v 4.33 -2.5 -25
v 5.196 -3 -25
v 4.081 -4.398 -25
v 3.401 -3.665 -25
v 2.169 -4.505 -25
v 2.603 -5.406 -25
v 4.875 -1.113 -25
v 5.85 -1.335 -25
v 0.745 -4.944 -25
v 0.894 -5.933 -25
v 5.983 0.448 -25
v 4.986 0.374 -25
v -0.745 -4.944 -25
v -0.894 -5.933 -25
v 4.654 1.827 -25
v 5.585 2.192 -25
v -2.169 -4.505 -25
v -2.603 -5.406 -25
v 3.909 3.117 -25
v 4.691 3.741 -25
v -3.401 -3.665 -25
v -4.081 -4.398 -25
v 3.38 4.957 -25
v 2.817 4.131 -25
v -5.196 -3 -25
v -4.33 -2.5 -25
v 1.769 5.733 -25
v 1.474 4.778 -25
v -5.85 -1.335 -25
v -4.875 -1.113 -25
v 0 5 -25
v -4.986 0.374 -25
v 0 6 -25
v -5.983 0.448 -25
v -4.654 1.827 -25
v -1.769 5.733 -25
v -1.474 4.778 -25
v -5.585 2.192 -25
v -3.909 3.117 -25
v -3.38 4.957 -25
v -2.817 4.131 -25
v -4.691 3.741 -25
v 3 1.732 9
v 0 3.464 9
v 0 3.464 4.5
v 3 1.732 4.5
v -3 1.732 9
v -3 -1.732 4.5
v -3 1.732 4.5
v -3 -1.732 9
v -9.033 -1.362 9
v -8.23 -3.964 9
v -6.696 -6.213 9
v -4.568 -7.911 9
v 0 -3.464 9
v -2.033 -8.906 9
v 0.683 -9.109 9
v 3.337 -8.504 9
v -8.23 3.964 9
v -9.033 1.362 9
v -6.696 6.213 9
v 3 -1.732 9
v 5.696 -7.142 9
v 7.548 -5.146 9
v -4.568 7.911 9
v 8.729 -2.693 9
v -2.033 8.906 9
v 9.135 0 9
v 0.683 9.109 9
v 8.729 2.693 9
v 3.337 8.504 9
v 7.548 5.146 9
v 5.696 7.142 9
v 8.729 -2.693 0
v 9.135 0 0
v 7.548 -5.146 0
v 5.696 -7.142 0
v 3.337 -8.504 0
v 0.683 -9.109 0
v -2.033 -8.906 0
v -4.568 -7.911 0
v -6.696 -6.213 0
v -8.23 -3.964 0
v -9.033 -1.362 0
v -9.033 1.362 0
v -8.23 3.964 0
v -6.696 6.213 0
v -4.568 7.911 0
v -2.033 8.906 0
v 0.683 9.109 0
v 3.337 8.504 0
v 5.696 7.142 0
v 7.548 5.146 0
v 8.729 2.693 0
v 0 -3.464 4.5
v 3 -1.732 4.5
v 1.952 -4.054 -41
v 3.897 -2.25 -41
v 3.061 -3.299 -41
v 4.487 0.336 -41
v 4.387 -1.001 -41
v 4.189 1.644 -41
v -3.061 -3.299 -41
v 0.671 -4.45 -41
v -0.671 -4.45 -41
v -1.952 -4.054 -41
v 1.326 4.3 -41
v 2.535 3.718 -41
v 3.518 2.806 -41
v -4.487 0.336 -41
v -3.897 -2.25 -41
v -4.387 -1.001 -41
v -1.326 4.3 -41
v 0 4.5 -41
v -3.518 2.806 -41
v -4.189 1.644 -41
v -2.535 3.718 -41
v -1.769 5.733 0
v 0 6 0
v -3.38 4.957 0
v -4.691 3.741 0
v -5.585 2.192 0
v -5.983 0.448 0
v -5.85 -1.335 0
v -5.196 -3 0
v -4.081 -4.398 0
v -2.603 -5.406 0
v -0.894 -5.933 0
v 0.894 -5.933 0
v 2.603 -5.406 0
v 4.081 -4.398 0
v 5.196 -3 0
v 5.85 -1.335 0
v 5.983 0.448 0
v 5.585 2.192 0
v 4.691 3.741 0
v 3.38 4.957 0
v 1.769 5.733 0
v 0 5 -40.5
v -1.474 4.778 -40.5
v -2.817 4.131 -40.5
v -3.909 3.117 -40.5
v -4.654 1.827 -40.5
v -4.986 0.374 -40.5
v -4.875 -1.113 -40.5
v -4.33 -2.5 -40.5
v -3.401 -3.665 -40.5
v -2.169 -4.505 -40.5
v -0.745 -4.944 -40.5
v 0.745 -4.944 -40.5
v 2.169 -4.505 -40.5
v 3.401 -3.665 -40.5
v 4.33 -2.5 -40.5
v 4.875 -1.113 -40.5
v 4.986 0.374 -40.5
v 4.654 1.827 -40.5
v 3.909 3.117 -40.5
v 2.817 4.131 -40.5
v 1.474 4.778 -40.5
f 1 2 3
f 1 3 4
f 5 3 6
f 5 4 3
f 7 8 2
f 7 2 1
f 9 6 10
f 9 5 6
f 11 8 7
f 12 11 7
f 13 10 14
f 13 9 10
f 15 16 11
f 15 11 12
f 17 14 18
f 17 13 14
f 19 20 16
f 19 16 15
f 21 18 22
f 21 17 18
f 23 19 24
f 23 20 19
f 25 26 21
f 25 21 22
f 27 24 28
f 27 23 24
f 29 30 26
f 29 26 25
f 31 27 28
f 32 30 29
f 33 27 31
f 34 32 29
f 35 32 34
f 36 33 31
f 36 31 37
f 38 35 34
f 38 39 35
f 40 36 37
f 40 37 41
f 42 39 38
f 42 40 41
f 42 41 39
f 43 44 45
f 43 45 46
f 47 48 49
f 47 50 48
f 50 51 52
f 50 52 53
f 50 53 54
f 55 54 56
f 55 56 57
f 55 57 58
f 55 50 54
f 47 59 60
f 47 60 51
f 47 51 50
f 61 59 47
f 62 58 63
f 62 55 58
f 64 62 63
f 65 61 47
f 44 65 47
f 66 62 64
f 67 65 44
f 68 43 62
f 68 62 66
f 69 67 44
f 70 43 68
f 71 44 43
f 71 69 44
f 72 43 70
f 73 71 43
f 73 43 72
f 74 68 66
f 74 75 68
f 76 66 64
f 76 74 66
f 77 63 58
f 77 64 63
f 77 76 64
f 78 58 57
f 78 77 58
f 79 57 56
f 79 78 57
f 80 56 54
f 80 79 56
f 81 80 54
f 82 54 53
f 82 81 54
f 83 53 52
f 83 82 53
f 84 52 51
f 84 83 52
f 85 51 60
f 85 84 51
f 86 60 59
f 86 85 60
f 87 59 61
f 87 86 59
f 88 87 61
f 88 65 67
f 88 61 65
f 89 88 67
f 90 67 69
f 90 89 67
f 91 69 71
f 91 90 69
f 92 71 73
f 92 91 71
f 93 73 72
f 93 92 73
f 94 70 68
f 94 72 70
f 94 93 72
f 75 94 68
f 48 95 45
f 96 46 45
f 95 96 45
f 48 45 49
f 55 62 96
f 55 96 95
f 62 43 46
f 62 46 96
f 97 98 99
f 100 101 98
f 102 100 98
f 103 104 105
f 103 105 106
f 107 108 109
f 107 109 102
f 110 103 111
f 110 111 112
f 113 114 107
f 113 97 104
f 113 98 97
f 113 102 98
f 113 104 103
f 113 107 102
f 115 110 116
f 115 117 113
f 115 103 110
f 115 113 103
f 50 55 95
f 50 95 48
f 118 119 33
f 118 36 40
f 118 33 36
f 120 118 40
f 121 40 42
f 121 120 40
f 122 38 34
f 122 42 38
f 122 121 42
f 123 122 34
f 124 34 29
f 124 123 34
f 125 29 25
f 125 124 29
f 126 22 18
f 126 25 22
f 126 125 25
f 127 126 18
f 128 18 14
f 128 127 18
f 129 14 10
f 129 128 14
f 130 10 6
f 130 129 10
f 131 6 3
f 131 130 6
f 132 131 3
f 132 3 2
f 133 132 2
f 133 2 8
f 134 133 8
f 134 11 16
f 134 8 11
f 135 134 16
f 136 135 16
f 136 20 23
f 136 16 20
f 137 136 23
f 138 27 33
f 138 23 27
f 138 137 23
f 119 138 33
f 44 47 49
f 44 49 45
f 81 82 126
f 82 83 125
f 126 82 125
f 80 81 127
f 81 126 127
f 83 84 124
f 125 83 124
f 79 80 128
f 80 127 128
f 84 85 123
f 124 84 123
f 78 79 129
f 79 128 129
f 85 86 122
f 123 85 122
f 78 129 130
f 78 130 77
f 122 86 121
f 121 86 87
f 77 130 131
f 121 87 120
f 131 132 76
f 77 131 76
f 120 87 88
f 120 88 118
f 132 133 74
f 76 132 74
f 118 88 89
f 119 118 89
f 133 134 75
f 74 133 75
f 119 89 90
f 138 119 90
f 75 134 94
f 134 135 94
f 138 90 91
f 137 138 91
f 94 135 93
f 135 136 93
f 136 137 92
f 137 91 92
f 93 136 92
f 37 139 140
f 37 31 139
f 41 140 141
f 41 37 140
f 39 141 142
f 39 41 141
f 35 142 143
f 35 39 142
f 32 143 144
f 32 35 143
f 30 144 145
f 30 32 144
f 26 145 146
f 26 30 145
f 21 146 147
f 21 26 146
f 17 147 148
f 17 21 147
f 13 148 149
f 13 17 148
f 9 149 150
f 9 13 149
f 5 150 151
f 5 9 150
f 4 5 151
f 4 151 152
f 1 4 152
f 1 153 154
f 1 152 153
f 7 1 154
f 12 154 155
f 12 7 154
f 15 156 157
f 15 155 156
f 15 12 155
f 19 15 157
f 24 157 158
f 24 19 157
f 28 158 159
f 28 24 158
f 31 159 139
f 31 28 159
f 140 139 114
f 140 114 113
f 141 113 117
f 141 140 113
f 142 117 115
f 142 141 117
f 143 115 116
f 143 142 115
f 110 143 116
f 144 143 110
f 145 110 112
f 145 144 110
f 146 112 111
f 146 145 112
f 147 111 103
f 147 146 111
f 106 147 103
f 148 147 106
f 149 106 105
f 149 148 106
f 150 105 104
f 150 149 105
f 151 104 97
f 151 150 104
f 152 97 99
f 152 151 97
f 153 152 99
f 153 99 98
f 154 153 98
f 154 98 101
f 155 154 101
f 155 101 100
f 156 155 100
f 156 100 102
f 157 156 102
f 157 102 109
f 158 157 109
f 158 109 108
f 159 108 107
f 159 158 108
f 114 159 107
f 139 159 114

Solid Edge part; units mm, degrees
sketch "Sketch1" plane through (0, 0, 0) normal (0, 0, 1) x (1, 0, 0)
  circle A0 centre (0, 0) radius 9.135
  dimension "D1" = 18.27
extrude "Protrusion1" add sketch "Sketch1" along normal blind 9
sketch "Sketch2" plane through (0, 0, 9) normal (0, 0, 1) x (1, 0, 0)
  line L0 (0, -3.4641) -> (-3, -1.7321)
  line L1 (-3, -1.7321) -> (-3, 1.7321)
  line L2 (-3, 1.7321) -> (0, 3.4641)
  line L3 (0, 3.4641) -> (3, 1.7321)
  line L4 (3, 1.7321) -> (3, -1.7321)
  line L5 (3, -1.7321) -> (0, -3.4641)
  dimension "D1" = 6
extrude "Cutout1" cut sketch "Sketch2" against normal blind 4.5
sketch "Sketch3" plane through (0, 0, 0) normal (0, 0, -1) x (0, 1, 0)
  circle A0 centre (0, 0) radius 6
  dimension "D1" = 12
extrude "Protrusion2" add sketch "Sketch3" along normal blind 25
sketch "Sketch4" plane through (0, 0, -25) normal (0, 0, -1) x (0, 1, 0)
  circle A0 centre (0, 0) radius 5
  dimension "D1" = 10
extrude "Protrusion3" add sketch "Sketch4" along normal blind 16
chamfer "Chamfer1" distance 0.5 angle 45 1 edges at (0, -5, -41)
properties part number "142603"
